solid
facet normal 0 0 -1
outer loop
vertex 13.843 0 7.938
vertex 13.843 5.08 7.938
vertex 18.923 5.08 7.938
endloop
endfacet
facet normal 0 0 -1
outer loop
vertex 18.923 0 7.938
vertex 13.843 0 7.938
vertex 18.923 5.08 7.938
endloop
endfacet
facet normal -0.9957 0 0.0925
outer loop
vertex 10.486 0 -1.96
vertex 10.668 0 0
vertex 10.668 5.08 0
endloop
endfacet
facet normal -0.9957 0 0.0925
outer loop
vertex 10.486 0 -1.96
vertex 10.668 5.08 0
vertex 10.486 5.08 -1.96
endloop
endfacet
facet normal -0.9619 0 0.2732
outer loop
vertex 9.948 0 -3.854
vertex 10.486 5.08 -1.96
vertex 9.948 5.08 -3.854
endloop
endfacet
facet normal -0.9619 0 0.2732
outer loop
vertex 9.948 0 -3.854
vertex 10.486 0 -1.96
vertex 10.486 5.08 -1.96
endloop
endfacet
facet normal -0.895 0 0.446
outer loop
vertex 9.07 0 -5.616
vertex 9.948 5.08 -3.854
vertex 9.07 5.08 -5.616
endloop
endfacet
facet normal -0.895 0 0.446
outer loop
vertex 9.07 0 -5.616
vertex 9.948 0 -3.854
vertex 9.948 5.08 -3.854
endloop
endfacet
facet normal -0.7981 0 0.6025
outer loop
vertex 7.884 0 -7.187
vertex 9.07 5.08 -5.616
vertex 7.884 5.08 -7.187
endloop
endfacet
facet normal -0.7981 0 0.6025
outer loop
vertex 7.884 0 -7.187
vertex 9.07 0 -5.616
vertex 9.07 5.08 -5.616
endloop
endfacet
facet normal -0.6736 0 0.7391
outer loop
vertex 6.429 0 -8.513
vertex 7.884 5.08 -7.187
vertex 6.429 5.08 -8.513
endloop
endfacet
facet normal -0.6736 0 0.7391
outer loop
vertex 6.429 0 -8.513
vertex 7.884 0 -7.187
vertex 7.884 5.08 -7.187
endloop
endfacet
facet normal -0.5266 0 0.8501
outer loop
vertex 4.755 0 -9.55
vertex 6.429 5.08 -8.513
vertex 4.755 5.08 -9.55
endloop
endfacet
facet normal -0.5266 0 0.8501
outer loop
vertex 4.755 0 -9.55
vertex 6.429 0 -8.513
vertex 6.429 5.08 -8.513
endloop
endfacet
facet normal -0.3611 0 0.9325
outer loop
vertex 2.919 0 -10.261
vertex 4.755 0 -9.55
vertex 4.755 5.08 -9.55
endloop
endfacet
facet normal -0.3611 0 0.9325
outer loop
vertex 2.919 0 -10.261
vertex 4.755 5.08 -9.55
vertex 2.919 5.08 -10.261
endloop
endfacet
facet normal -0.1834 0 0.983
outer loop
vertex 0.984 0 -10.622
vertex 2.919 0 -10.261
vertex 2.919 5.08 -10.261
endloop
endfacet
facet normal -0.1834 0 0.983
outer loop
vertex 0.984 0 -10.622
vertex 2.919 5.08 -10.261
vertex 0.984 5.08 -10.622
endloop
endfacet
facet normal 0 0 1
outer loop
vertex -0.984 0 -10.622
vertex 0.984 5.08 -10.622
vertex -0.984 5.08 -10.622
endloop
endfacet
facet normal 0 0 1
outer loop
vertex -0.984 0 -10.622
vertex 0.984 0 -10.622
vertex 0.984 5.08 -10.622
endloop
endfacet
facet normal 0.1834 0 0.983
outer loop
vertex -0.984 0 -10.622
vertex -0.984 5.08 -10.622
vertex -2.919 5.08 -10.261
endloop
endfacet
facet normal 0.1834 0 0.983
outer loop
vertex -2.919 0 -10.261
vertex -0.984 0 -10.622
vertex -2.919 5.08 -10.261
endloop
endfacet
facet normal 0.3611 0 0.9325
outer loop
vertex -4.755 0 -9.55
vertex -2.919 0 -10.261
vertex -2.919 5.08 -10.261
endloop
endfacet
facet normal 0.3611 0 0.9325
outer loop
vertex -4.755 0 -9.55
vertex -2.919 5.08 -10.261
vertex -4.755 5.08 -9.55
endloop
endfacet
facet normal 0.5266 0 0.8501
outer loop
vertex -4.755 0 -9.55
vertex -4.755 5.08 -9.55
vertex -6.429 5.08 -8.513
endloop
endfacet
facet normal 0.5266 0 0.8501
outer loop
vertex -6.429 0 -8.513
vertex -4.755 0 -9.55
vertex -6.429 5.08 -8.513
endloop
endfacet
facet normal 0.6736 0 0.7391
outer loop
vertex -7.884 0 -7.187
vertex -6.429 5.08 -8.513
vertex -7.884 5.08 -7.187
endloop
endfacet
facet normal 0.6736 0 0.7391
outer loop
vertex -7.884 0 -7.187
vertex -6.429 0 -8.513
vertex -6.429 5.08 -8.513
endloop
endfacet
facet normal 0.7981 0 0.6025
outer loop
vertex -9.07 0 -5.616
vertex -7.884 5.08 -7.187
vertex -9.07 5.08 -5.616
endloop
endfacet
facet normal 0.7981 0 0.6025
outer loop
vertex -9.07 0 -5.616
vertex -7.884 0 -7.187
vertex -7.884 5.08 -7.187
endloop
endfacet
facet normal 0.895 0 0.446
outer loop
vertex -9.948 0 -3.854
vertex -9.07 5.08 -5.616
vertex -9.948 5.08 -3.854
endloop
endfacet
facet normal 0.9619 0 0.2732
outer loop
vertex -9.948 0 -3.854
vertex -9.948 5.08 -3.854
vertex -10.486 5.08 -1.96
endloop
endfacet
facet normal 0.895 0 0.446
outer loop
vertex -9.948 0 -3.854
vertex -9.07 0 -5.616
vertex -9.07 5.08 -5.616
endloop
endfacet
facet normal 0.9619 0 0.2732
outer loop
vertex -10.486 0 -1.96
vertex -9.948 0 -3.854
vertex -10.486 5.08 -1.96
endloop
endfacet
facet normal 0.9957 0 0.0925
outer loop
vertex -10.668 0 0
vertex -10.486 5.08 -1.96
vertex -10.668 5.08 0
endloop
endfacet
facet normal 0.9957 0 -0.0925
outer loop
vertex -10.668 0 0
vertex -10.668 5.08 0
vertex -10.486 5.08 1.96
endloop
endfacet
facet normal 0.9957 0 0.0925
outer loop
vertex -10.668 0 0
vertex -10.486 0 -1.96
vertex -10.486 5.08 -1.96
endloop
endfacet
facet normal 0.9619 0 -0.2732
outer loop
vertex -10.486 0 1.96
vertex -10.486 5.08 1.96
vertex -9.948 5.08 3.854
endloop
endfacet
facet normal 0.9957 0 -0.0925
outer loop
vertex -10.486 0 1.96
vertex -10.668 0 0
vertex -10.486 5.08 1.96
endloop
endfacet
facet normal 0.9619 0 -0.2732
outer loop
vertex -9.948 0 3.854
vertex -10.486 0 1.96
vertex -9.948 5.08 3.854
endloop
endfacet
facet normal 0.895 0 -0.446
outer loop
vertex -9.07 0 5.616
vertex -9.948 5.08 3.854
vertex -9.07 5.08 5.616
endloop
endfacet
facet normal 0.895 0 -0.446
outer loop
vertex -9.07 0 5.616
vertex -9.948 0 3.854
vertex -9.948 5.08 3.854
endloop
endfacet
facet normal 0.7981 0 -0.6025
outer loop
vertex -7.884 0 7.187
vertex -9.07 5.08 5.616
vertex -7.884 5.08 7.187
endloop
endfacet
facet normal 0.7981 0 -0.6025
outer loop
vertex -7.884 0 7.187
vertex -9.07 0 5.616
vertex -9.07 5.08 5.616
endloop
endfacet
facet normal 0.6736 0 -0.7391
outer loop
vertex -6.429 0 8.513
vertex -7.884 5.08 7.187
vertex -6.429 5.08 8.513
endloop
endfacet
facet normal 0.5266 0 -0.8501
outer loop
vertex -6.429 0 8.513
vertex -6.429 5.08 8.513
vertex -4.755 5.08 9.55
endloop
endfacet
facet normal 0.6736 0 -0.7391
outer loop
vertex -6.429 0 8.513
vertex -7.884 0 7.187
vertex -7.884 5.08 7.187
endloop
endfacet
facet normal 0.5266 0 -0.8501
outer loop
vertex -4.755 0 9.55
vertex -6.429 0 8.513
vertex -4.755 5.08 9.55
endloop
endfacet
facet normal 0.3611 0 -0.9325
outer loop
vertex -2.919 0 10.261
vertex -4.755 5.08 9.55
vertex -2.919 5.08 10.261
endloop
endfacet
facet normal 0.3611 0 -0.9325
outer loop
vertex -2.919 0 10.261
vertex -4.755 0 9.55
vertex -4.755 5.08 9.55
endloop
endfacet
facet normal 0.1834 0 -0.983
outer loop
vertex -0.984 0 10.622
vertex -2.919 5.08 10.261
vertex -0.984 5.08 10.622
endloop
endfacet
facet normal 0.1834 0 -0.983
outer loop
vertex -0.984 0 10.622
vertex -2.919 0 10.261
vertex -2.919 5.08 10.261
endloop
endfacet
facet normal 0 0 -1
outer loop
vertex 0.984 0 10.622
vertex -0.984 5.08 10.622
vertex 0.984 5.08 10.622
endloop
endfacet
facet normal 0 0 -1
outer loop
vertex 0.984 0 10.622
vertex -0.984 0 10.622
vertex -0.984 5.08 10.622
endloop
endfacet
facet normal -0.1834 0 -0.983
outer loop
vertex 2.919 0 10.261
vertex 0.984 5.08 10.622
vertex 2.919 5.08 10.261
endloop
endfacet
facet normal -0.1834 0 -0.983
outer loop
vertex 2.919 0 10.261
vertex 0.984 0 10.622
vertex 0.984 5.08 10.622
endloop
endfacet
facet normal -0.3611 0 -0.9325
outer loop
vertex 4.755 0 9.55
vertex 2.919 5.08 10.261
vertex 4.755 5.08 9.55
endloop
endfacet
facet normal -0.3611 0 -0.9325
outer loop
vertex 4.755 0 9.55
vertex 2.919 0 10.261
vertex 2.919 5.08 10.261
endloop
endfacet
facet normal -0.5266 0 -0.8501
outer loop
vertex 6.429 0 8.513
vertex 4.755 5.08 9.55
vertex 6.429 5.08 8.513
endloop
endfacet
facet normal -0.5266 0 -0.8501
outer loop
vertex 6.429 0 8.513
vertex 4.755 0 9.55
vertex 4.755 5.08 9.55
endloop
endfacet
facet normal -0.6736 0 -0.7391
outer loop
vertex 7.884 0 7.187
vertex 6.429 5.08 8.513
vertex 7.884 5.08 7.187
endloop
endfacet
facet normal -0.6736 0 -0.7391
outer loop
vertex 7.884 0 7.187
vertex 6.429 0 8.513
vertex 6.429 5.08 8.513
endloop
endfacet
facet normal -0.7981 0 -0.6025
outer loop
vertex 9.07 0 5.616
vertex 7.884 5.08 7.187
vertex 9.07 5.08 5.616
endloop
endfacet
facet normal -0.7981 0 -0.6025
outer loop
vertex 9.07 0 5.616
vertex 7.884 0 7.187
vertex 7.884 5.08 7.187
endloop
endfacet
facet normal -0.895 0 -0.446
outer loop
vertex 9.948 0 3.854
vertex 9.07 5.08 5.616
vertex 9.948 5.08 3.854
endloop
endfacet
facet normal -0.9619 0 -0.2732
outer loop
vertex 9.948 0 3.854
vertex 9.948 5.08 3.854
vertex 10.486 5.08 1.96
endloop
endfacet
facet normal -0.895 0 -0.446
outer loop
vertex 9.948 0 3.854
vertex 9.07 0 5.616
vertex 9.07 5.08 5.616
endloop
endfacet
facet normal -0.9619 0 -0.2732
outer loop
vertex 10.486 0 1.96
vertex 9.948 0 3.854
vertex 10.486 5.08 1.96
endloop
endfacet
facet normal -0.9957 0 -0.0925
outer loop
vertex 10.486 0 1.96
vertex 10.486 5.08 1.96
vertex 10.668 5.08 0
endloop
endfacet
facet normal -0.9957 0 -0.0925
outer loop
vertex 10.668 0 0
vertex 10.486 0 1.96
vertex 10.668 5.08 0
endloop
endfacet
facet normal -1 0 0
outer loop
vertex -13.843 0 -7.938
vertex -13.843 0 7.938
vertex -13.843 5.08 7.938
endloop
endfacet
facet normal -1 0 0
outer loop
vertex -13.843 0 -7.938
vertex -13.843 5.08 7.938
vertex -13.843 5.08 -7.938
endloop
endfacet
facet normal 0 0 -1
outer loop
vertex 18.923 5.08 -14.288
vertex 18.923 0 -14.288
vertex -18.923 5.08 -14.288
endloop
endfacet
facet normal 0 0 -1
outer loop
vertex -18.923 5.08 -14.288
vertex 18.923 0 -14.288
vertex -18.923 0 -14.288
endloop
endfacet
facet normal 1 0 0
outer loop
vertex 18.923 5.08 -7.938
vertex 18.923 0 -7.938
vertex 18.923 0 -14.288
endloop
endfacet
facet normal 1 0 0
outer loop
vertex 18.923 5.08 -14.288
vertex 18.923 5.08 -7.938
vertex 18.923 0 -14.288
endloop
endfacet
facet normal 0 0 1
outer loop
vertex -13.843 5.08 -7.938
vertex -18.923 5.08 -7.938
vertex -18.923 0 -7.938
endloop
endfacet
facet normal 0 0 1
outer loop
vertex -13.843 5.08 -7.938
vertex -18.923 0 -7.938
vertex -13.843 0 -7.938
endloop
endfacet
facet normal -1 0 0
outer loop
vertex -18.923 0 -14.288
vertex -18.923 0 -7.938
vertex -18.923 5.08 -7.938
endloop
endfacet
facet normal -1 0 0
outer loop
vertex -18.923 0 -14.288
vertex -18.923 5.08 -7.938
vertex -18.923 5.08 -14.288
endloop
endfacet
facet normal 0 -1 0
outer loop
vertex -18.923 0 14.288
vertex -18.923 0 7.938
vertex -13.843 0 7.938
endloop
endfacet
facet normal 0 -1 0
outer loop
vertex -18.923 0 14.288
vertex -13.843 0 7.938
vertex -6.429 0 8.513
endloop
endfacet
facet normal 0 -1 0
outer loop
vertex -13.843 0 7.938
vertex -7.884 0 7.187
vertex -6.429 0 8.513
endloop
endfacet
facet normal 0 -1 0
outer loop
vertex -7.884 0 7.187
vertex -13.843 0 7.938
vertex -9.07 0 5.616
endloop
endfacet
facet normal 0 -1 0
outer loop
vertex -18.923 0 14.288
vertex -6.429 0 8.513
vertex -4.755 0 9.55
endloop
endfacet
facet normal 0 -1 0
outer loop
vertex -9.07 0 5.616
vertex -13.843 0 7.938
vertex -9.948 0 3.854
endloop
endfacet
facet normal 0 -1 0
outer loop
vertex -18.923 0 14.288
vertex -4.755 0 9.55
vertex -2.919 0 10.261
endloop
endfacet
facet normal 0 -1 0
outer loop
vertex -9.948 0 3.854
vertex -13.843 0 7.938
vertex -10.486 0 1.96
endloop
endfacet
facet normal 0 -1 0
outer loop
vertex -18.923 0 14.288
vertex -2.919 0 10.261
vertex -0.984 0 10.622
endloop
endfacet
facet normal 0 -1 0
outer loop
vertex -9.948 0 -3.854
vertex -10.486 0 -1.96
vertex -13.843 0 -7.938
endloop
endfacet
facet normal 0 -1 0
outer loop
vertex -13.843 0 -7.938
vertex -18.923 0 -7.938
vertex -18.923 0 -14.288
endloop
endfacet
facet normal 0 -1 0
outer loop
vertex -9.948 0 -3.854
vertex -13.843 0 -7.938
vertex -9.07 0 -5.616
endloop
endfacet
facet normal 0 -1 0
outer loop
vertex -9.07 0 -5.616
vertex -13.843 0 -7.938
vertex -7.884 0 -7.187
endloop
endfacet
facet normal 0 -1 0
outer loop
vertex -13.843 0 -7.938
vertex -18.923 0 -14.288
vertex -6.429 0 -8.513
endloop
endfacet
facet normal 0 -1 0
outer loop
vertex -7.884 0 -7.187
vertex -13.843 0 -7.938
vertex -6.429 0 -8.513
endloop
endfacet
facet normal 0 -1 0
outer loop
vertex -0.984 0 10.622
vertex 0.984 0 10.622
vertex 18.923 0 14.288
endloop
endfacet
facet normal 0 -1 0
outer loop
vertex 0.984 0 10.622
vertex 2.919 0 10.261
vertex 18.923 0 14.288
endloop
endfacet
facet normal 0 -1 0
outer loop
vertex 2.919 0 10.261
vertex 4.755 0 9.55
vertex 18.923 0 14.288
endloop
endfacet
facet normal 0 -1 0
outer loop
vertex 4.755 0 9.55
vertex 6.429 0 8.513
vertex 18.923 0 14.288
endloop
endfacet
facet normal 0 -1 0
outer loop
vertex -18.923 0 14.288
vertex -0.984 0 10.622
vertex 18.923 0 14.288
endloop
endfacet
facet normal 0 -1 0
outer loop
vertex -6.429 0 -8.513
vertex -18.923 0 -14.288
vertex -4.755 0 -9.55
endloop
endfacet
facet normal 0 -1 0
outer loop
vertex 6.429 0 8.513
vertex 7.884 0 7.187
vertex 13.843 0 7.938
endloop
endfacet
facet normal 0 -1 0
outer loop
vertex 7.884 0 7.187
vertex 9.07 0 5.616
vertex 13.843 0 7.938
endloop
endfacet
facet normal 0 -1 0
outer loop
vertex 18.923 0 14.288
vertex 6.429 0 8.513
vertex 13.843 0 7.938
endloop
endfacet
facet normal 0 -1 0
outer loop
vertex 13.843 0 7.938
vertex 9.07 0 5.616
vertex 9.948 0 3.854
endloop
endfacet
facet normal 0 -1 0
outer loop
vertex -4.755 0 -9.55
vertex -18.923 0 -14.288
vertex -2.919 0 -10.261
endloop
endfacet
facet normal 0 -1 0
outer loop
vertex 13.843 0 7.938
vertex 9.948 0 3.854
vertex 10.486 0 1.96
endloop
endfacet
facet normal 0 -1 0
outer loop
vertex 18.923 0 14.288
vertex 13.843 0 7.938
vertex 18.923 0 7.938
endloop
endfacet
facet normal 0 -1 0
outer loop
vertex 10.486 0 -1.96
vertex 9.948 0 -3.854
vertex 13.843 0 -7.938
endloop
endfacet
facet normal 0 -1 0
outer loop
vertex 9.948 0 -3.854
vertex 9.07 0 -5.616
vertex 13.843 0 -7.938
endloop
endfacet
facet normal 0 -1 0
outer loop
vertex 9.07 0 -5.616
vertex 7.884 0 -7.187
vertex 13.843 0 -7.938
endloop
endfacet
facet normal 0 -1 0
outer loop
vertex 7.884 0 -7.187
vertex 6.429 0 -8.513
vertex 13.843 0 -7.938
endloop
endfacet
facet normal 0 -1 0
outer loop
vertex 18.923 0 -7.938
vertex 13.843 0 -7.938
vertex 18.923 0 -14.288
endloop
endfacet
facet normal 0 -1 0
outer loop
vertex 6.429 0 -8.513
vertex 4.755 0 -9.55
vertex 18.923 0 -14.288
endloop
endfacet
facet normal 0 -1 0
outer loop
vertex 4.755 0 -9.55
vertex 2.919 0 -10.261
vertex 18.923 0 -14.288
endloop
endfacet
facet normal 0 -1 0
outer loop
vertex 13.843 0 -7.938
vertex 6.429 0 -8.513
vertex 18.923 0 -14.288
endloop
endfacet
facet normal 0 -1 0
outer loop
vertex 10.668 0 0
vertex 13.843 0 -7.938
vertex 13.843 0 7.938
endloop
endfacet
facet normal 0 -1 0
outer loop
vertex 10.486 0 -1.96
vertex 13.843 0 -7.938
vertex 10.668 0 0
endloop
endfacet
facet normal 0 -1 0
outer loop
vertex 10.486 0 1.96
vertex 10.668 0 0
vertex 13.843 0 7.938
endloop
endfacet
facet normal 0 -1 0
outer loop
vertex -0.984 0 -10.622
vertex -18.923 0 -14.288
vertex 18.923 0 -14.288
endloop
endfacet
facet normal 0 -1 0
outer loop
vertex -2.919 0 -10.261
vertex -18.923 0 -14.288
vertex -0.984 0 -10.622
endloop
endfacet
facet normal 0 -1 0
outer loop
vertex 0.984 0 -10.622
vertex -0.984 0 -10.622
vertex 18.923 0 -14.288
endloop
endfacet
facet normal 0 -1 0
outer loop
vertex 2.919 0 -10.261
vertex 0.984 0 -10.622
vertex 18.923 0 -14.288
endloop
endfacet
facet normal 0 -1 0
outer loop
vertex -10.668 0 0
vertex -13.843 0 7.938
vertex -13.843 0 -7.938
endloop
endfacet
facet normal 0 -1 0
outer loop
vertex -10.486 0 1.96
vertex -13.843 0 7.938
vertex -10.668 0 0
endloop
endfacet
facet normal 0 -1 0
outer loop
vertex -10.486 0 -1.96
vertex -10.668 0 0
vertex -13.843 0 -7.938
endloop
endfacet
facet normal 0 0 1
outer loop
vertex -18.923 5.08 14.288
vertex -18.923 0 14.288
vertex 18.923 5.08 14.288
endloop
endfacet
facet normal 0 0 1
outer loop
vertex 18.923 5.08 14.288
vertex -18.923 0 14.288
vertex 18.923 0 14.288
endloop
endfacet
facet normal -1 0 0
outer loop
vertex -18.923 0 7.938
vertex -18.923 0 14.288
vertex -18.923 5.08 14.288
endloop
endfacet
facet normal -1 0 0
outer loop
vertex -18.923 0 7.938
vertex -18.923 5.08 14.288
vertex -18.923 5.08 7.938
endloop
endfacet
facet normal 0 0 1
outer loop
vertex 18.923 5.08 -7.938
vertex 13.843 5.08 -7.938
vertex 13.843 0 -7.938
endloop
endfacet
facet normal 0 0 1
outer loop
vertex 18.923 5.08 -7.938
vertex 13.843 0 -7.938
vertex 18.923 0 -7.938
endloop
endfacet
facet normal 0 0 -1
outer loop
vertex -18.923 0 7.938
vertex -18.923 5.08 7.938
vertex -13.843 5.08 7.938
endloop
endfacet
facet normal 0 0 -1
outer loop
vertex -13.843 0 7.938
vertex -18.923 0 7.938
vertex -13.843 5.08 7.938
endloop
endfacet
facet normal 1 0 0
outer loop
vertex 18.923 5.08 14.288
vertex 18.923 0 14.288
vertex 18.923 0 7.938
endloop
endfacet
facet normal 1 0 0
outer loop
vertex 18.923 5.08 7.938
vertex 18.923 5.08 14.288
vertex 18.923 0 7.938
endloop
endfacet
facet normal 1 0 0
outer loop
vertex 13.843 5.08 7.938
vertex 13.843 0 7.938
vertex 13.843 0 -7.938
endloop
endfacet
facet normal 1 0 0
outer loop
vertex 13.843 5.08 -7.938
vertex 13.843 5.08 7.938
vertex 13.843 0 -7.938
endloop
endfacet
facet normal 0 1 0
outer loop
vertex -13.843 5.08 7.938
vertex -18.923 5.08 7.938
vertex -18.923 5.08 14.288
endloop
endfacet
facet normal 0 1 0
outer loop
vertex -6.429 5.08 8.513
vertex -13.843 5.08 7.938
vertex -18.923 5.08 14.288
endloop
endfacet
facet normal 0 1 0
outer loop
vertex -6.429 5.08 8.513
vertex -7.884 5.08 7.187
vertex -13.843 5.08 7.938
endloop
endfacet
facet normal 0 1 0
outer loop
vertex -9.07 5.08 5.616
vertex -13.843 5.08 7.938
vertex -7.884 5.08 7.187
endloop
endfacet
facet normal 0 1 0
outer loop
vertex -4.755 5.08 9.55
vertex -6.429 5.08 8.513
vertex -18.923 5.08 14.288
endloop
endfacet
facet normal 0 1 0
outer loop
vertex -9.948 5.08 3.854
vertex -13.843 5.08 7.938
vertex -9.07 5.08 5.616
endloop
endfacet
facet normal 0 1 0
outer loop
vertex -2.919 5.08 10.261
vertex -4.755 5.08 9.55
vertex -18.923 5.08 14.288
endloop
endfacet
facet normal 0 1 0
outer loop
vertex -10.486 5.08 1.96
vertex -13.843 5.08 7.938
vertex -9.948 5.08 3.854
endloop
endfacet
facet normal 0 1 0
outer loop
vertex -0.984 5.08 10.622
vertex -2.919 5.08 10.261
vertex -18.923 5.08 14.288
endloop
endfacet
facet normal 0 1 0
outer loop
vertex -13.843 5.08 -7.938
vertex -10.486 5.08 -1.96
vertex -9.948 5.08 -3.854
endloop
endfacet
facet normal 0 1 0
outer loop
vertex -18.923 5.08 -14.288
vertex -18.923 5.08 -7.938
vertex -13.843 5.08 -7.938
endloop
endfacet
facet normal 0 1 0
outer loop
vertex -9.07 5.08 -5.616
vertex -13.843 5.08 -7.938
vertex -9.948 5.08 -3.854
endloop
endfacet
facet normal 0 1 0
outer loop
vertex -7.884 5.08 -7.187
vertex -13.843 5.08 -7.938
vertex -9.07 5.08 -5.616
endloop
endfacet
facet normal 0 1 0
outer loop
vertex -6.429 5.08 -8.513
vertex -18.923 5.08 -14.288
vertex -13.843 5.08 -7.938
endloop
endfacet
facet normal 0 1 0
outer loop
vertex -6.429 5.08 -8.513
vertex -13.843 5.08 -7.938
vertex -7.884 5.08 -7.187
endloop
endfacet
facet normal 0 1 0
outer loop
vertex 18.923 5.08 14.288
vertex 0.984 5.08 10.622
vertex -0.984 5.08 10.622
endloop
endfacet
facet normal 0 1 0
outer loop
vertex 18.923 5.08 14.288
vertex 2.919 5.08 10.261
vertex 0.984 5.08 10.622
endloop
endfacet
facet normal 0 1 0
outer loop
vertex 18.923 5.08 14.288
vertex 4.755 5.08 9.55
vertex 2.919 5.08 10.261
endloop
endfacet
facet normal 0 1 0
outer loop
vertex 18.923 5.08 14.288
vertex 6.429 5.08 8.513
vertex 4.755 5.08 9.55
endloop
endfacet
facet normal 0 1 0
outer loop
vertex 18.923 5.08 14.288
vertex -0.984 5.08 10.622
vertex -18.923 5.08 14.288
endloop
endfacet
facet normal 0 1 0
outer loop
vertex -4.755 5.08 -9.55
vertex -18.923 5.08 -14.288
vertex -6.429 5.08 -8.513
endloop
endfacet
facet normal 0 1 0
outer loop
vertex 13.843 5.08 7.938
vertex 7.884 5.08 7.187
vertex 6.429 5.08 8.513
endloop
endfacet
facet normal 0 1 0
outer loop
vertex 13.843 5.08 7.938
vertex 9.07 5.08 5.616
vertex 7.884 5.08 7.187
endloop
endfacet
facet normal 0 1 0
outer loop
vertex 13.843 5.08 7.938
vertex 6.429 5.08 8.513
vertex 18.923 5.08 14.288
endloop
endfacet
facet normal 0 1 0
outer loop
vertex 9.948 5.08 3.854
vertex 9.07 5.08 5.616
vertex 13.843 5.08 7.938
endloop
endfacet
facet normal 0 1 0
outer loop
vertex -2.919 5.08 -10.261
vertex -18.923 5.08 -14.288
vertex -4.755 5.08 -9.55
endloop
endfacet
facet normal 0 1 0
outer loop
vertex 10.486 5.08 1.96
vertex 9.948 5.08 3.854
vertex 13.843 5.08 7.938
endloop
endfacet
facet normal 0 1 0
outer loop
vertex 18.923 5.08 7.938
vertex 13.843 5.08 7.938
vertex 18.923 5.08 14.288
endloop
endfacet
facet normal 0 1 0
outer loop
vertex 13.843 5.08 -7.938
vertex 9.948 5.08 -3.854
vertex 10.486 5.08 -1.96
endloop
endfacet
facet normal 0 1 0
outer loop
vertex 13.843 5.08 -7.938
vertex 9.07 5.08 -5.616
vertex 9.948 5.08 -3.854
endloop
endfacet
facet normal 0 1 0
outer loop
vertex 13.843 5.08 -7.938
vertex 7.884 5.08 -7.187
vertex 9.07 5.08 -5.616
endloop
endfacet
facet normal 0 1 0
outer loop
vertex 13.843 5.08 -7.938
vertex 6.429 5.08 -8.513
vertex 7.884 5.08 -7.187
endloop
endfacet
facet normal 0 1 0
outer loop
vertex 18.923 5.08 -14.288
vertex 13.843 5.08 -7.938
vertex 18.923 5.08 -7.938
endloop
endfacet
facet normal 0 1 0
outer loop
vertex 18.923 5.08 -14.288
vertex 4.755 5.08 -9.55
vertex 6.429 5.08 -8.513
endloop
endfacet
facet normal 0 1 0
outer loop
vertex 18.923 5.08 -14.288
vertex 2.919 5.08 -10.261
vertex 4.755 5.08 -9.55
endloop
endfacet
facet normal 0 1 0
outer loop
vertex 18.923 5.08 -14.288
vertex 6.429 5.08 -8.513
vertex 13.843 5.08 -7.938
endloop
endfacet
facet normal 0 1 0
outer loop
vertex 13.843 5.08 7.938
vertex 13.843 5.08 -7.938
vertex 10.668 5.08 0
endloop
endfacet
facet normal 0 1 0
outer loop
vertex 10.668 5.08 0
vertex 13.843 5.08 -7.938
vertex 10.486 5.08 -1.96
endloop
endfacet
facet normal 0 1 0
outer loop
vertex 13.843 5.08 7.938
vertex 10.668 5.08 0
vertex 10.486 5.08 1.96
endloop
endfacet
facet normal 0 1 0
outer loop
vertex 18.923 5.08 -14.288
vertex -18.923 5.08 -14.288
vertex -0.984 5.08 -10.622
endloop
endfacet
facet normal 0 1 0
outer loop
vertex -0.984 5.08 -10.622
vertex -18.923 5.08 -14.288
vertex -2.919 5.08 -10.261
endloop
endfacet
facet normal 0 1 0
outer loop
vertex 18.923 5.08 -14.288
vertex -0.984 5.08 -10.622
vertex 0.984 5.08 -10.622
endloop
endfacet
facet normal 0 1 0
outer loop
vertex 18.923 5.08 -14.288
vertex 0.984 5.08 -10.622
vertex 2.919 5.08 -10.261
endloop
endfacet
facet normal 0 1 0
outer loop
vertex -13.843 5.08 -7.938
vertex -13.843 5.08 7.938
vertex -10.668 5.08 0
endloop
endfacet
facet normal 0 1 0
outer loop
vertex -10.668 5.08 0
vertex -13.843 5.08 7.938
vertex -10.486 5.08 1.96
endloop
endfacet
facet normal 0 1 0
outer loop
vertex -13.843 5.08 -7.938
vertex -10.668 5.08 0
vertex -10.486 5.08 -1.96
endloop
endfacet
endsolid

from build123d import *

# Parameters (mm, degrees)
SKETCH1_W           = 5.08
SKETCH1_H           = 6.35
SKETCH1_W_2         = 27.686
SKETCH1_H_2         = 28.575
SKETCH1_R           = 10.668
BOSS_EXTRUDE1_DEPTH = 5.08


with BuildPart() as part:
    # Sketch1 → Boss-Extrude1 (new body)
    with BuildSketch(Plane(origin=(0, 0, 0), x_dir=(1, 0, 0), z_dir=(0, 1, 0))):
        with Locations((-16.383, -11.1125)):
            Rectangle(SKETCH1_W, SKETCH1_H)
        with Locations((-16.383, 11.1125)):
            Rectangle(SKETCH1_W, SKETCH1_H)
        Rectangle(SKETCH1_W_2, SKETCH1_H_2)
        Circle(SKETCH1_R, mode=Mode.SUBTRACT)
        with Locations((16.383, 11.1125)):
            Rectangle(SKETCH1_W, SKETCH1_H)
        with Locations((16.383, -11.1125)):
            Rectangle(SKETCH1_W, SKETCH1_H)
    extrude(amount=BOSS_EXTRUDE1_DEPTH)


solid = part.part
